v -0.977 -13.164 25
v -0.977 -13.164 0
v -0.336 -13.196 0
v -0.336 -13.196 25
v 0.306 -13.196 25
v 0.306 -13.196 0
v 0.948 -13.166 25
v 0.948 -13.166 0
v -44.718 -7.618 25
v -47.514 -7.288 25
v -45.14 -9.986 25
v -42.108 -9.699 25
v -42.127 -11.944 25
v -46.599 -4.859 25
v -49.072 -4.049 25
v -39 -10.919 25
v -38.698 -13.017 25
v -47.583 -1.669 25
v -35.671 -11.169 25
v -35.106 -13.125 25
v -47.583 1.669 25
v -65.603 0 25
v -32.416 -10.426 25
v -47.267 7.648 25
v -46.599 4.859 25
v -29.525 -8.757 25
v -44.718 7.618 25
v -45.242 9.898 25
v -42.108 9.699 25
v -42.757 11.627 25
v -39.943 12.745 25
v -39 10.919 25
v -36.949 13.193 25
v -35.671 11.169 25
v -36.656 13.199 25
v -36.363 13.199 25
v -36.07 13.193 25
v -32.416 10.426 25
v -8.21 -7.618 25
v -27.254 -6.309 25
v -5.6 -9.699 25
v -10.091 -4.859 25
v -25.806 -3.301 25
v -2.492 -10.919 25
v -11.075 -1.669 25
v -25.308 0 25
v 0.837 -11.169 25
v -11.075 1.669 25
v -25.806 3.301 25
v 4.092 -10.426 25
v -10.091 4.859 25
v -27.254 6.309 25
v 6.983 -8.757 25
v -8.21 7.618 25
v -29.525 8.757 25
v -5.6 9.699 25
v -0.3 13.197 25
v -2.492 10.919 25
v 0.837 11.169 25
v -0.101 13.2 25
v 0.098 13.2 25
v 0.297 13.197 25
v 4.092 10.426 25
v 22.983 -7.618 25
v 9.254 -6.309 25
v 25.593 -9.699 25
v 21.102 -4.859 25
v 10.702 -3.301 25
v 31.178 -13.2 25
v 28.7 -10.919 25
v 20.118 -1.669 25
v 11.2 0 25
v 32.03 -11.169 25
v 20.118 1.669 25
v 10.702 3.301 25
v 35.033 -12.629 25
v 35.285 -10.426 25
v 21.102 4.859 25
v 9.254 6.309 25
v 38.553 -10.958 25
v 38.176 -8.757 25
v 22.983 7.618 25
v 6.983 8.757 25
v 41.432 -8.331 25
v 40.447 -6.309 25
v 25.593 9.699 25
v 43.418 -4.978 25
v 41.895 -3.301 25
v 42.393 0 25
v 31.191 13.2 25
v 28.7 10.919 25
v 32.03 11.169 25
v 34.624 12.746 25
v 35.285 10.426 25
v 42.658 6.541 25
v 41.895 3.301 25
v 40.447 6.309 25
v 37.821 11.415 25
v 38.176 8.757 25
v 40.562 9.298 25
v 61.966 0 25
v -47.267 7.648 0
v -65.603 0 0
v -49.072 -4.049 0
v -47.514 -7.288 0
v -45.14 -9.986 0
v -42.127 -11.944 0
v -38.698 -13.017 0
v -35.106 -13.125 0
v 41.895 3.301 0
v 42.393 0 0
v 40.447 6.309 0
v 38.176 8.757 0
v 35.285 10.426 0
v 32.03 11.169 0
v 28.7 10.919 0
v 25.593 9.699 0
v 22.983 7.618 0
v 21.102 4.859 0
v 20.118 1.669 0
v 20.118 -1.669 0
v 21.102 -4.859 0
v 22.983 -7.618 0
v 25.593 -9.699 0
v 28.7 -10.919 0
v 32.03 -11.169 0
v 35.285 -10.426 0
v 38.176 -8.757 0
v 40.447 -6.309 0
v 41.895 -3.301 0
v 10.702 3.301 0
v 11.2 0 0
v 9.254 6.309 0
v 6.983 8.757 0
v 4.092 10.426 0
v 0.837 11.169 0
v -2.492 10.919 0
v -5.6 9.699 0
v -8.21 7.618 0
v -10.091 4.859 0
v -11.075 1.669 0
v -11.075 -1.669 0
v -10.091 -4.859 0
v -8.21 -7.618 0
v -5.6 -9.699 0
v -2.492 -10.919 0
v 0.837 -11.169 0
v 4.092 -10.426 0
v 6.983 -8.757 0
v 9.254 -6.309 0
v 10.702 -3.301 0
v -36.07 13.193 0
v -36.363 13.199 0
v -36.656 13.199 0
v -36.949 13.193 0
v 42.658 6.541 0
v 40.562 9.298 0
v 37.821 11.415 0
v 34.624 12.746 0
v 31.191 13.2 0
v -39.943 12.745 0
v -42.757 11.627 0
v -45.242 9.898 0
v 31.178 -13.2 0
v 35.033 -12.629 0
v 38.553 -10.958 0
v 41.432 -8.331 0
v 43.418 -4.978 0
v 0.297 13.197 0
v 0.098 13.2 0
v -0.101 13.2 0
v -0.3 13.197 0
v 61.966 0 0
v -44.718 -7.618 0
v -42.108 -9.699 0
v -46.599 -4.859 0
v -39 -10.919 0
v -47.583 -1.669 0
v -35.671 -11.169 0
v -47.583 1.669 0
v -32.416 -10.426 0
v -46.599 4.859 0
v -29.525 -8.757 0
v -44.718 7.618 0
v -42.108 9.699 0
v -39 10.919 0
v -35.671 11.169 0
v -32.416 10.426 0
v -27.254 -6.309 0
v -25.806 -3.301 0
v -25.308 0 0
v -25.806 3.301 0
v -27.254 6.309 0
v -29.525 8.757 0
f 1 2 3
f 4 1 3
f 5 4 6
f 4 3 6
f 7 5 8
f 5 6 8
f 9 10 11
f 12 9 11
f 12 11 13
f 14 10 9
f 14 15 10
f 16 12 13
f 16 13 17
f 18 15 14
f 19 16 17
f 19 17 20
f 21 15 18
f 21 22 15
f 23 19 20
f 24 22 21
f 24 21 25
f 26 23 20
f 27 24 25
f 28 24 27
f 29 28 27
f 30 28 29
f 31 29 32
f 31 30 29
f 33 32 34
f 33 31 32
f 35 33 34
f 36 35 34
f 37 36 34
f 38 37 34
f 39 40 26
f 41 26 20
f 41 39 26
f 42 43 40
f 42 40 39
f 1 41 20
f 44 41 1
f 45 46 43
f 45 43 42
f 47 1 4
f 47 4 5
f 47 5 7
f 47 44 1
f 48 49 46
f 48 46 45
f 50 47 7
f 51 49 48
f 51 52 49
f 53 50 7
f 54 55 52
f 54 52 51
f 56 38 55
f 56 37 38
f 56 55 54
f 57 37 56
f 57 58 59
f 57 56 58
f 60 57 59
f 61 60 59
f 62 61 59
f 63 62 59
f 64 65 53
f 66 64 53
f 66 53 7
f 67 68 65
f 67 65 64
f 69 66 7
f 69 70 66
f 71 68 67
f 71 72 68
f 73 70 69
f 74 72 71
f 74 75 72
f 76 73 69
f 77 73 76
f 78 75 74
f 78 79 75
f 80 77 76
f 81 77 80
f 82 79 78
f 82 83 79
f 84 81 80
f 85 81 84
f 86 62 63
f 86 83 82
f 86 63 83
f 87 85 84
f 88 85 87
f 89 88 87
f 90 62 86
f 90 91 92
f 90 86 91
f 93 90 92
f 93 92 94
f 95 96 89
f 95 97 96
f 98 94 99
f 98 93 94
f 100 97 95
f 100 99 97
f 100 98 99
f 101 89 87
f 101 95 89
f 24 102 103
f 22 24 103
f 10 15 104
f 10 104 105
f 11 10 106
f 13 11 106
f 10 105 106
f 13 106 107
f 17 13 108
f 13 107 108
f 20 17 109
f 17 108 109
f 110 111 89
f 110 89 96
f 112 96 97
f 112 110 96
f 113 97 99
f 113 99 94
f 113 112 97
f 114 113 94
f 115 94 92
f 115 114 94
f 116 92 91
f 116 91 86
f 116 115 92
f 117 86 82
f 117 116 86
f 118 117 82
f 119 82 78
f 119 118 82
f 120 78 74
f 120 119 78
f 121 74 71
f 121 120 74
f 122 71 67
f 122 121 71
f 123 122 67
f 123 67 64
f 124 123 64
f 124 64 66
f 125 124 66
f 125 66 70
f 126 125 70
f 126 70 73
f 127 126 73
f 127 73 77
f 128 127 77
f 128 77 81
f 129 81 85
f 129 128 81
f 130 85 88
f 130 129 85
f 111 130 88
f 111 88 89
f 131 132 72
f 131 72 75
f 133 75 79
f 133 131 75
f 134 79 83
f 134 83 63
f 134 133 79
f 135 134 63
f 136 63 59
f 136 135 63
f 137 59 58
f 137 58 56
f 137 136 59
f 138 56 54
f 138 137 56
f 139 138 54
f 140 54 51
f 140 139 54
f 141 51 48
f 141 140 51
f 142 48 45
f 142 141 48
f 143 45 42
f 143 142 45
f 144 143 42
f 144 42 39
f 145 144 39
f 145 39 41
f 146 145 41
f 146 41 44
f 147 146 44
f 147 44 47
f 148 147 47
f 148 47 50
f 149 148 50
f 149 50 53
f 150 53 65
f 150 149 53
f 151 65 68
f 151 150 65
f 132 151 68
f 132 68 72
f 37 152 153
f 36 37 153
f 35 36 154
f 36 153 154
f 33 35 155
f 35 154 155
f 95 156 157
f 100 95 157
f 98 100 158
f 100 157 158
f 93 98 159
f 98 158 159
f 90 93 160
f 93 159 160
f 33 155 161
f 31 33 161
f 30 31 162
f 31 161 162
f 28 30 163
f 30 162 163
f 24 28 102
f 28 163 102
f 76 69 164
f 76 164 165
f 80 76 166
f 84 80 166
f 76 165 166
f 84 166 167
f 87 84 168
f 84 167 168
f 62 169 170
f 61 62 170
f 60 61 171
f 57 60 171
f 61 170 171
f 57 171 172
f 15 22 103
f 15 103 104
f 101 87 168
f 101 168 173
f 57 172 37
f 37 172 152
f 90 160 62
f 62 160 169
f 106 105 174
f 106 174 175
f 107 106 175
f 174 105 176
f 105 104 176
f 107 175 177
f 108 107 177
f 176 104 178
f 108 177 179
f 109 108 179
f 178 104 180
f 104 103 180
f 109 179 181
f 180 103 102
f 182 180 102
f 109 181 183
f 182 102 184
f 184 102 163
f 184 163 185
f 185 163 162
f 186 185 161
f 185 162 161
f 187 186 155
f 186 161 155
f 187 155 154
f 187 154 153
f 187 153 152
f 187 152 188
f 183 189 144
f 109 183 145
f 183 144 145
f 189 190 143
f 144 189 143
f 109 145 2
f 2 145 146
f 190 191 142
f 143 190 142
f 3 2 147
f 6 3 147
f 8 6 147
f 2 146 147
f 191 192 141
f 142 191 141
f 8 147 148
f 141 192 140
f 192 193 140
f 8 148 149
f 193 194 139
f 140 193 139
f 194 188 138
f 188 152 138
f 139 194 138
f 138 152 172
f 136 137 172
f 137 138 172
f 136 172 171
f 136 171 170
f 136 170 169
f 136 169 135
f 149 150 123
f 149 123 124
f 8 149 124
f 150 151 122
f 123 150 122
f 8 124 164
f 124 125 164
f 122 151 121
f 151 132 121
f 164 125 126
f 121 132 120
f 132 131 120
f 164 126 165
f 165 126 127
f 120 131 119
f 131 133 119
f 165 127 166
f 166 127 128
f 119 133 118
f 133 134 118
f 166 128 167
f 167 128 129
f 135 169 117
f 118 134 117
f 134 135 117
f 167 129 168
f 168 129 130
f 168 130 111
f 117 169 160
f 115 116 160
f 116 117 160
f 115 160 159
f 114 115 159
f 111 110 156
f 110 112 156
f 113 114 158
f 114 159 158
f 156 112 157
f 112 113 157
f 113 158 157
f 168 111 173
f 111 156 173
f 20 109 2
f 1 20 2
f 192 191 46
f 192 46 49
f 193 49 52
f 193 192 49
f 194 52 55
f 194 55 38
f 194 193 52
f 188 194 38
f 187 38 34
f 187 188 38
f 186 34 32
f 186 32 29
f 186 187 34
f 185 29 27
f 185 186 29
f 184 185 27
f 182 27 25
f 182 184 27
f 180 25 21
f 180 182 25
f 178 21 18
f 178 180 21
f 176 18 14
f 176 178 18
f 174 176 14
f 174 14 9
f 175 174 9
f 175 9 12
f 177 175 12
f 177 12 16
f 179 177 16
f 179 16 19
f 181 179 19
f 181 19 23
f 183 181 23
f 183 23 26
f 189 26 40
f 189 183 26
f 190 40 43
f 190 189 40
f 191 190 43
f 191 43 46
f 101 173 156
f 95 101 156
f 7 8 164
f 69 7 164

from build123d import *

# Parameters (mm, degrees)
F0_R     = 11.2
F1_DEPTH = 25


with BuildPart() as f1:
    # F0 (on Top) → F1 (new body)
    with BuildSketch(Plane.XY):
        with BuildLine():
            ThreePointArc((0.9477981241, -13.1659287069), (9.6630982412, -8.9924708718), (13.2, 0))
            ThreePointArc((13.2, 0), (9.438299675, 9.2281362823), (0.2971970842, 13.19665389))
            Line((0.2971970842, 13.19665389), (-0.3000556461, 13.1965892036))
            ThreePointArc((-0.3000556461, 13.1965892036), (-13.1956435727, 0.3391027885), (-0.9774661602, -13.1637593379))
            Line((-0.9774661602, -13.1637593379), (0.9477981241, -13.1659287069))
        make_face()
        Circle(F0_R, mode=Mode.SUBTRACT)
        with BuildLine():
            ThreePointArc((0.2971970842, 13.19665389), (9.438299675, 9.2281362823), (13.2, 0))
            ThreePointArc((13.2, 0), (9.6630982412, -8.9924708718), (0.9477981241, -13.1659287069))
            Line((0.9477981241, -13.1659287069), (31.1778370012, -13.1999916203))
            ThreePointArc((31.1778370012, -13.1999916203), (38.5529222641, -10.9575218275), (43.4179762546, -4.9782406771))
            ThreePointArc((43.4179762546, -4.9782406771), (44.3640726701, 0.8690349983), (42.6579258061, 6.5413179718))
            ThreePointArc((42.6579258061, 6.5413179718), (37.8213685594, 11.4149416978), (31.1912809763, 13.1999999226))
            Line((31.1912809763, 13.1999999226), (0.2971970842, 13.19665389))
        make_face()
        with Locations((31.1927106231, 0)):
            Circle(F0_R, mode=Mode.SUBTRACT)
        with BuildLine():
            Line((-0.3000556461, 13.1965892036), (0.2971970842, 13.19665389))
            ThreePointArc((0.2971970842, 13.19665389), (-0.0014296468, 13.1999999226), (-0.3000556461, 13.1965892036))
        make_face()
        with BuildLine():
            ThreePointArc((-0.9774661602, -13.1637593379), (-0.014873622, -13.1999916203), (0.9477981241, -13.1659287069))
            Line((0.9477981241, -13.1659287069), (-0.9774661602, -13.1637593379))
        make_face()
        with BuildLine():
            ThreePointArc((-0.9774661602, -13.1637593379), (-13.1956435727, 0.3391027885), (-0.3000556461, 13.1965892036))
            Line((-0.3000556461, 13.1965892036), (-36.0695777831, 13.192715129))
            Line((-36.0695777831, 13.192715129), (-36.9494019058, 13.1926198383))
            ThreePointArc((-36.9494019058, 13.1926198383), (-42.7568480948, 11.627237838), (-47.2668801052, 7.6477324276))
            ThreePointArc((-47.2668801052, 7.6477324276), (-49.5537048838, 2.0127531993), (-49.0715828762, -4.0494342641))
            ThreePointArc((-49.0715828762, -4.0494342641), (-43.7008466332, -11.0681450441), (-35.1057779137, -13.1253038886))
            Line((-35.1057779137, -13.1253038886), (-0.9774661602, -13.1637593379))
        make_face()
        with Locations((-36.5080609918, 0)):
            Circle(F0_R, mode=Mode.SUBTRACT)
        with BuildLine():
            Line((-36.9494019058, 13.1926198383), (-36.0695777831, 13.192715129))
            ThreePointArc((-36.0695777831, 13.192715129), (-36.5094906386, 13.1999999226), (-36.9494019058, 13.1926198383))
        make_face()
        with BuildLine():
            Line((61.9657859206, 0), (42.6579258061, 6.5413179718))
            ThreePointArc((42.6579258061, 6.5413179718), (44.3640726701, 0.8690349983), (43.4179762546, -4.9782406771))
            Line((43.4179762546, -4.9782406771), (61.9657859206, 0))
        make_face()
        with BuildLine():
            Line((-65.6026080251, 0), (-49.0715828762, -4.0494342641))
            ThreePointArc((-49.0715828762, -4.0494342641), (-49.5537048838, 2.0127531993), (-47.2668801052, 7.6477324276))
            Line((-47.2668801052, 7.6477324276), (-65.6026080251, 0))
        make_face()
    extrude(amount=F1_DEPTH)


solid = f1.part
